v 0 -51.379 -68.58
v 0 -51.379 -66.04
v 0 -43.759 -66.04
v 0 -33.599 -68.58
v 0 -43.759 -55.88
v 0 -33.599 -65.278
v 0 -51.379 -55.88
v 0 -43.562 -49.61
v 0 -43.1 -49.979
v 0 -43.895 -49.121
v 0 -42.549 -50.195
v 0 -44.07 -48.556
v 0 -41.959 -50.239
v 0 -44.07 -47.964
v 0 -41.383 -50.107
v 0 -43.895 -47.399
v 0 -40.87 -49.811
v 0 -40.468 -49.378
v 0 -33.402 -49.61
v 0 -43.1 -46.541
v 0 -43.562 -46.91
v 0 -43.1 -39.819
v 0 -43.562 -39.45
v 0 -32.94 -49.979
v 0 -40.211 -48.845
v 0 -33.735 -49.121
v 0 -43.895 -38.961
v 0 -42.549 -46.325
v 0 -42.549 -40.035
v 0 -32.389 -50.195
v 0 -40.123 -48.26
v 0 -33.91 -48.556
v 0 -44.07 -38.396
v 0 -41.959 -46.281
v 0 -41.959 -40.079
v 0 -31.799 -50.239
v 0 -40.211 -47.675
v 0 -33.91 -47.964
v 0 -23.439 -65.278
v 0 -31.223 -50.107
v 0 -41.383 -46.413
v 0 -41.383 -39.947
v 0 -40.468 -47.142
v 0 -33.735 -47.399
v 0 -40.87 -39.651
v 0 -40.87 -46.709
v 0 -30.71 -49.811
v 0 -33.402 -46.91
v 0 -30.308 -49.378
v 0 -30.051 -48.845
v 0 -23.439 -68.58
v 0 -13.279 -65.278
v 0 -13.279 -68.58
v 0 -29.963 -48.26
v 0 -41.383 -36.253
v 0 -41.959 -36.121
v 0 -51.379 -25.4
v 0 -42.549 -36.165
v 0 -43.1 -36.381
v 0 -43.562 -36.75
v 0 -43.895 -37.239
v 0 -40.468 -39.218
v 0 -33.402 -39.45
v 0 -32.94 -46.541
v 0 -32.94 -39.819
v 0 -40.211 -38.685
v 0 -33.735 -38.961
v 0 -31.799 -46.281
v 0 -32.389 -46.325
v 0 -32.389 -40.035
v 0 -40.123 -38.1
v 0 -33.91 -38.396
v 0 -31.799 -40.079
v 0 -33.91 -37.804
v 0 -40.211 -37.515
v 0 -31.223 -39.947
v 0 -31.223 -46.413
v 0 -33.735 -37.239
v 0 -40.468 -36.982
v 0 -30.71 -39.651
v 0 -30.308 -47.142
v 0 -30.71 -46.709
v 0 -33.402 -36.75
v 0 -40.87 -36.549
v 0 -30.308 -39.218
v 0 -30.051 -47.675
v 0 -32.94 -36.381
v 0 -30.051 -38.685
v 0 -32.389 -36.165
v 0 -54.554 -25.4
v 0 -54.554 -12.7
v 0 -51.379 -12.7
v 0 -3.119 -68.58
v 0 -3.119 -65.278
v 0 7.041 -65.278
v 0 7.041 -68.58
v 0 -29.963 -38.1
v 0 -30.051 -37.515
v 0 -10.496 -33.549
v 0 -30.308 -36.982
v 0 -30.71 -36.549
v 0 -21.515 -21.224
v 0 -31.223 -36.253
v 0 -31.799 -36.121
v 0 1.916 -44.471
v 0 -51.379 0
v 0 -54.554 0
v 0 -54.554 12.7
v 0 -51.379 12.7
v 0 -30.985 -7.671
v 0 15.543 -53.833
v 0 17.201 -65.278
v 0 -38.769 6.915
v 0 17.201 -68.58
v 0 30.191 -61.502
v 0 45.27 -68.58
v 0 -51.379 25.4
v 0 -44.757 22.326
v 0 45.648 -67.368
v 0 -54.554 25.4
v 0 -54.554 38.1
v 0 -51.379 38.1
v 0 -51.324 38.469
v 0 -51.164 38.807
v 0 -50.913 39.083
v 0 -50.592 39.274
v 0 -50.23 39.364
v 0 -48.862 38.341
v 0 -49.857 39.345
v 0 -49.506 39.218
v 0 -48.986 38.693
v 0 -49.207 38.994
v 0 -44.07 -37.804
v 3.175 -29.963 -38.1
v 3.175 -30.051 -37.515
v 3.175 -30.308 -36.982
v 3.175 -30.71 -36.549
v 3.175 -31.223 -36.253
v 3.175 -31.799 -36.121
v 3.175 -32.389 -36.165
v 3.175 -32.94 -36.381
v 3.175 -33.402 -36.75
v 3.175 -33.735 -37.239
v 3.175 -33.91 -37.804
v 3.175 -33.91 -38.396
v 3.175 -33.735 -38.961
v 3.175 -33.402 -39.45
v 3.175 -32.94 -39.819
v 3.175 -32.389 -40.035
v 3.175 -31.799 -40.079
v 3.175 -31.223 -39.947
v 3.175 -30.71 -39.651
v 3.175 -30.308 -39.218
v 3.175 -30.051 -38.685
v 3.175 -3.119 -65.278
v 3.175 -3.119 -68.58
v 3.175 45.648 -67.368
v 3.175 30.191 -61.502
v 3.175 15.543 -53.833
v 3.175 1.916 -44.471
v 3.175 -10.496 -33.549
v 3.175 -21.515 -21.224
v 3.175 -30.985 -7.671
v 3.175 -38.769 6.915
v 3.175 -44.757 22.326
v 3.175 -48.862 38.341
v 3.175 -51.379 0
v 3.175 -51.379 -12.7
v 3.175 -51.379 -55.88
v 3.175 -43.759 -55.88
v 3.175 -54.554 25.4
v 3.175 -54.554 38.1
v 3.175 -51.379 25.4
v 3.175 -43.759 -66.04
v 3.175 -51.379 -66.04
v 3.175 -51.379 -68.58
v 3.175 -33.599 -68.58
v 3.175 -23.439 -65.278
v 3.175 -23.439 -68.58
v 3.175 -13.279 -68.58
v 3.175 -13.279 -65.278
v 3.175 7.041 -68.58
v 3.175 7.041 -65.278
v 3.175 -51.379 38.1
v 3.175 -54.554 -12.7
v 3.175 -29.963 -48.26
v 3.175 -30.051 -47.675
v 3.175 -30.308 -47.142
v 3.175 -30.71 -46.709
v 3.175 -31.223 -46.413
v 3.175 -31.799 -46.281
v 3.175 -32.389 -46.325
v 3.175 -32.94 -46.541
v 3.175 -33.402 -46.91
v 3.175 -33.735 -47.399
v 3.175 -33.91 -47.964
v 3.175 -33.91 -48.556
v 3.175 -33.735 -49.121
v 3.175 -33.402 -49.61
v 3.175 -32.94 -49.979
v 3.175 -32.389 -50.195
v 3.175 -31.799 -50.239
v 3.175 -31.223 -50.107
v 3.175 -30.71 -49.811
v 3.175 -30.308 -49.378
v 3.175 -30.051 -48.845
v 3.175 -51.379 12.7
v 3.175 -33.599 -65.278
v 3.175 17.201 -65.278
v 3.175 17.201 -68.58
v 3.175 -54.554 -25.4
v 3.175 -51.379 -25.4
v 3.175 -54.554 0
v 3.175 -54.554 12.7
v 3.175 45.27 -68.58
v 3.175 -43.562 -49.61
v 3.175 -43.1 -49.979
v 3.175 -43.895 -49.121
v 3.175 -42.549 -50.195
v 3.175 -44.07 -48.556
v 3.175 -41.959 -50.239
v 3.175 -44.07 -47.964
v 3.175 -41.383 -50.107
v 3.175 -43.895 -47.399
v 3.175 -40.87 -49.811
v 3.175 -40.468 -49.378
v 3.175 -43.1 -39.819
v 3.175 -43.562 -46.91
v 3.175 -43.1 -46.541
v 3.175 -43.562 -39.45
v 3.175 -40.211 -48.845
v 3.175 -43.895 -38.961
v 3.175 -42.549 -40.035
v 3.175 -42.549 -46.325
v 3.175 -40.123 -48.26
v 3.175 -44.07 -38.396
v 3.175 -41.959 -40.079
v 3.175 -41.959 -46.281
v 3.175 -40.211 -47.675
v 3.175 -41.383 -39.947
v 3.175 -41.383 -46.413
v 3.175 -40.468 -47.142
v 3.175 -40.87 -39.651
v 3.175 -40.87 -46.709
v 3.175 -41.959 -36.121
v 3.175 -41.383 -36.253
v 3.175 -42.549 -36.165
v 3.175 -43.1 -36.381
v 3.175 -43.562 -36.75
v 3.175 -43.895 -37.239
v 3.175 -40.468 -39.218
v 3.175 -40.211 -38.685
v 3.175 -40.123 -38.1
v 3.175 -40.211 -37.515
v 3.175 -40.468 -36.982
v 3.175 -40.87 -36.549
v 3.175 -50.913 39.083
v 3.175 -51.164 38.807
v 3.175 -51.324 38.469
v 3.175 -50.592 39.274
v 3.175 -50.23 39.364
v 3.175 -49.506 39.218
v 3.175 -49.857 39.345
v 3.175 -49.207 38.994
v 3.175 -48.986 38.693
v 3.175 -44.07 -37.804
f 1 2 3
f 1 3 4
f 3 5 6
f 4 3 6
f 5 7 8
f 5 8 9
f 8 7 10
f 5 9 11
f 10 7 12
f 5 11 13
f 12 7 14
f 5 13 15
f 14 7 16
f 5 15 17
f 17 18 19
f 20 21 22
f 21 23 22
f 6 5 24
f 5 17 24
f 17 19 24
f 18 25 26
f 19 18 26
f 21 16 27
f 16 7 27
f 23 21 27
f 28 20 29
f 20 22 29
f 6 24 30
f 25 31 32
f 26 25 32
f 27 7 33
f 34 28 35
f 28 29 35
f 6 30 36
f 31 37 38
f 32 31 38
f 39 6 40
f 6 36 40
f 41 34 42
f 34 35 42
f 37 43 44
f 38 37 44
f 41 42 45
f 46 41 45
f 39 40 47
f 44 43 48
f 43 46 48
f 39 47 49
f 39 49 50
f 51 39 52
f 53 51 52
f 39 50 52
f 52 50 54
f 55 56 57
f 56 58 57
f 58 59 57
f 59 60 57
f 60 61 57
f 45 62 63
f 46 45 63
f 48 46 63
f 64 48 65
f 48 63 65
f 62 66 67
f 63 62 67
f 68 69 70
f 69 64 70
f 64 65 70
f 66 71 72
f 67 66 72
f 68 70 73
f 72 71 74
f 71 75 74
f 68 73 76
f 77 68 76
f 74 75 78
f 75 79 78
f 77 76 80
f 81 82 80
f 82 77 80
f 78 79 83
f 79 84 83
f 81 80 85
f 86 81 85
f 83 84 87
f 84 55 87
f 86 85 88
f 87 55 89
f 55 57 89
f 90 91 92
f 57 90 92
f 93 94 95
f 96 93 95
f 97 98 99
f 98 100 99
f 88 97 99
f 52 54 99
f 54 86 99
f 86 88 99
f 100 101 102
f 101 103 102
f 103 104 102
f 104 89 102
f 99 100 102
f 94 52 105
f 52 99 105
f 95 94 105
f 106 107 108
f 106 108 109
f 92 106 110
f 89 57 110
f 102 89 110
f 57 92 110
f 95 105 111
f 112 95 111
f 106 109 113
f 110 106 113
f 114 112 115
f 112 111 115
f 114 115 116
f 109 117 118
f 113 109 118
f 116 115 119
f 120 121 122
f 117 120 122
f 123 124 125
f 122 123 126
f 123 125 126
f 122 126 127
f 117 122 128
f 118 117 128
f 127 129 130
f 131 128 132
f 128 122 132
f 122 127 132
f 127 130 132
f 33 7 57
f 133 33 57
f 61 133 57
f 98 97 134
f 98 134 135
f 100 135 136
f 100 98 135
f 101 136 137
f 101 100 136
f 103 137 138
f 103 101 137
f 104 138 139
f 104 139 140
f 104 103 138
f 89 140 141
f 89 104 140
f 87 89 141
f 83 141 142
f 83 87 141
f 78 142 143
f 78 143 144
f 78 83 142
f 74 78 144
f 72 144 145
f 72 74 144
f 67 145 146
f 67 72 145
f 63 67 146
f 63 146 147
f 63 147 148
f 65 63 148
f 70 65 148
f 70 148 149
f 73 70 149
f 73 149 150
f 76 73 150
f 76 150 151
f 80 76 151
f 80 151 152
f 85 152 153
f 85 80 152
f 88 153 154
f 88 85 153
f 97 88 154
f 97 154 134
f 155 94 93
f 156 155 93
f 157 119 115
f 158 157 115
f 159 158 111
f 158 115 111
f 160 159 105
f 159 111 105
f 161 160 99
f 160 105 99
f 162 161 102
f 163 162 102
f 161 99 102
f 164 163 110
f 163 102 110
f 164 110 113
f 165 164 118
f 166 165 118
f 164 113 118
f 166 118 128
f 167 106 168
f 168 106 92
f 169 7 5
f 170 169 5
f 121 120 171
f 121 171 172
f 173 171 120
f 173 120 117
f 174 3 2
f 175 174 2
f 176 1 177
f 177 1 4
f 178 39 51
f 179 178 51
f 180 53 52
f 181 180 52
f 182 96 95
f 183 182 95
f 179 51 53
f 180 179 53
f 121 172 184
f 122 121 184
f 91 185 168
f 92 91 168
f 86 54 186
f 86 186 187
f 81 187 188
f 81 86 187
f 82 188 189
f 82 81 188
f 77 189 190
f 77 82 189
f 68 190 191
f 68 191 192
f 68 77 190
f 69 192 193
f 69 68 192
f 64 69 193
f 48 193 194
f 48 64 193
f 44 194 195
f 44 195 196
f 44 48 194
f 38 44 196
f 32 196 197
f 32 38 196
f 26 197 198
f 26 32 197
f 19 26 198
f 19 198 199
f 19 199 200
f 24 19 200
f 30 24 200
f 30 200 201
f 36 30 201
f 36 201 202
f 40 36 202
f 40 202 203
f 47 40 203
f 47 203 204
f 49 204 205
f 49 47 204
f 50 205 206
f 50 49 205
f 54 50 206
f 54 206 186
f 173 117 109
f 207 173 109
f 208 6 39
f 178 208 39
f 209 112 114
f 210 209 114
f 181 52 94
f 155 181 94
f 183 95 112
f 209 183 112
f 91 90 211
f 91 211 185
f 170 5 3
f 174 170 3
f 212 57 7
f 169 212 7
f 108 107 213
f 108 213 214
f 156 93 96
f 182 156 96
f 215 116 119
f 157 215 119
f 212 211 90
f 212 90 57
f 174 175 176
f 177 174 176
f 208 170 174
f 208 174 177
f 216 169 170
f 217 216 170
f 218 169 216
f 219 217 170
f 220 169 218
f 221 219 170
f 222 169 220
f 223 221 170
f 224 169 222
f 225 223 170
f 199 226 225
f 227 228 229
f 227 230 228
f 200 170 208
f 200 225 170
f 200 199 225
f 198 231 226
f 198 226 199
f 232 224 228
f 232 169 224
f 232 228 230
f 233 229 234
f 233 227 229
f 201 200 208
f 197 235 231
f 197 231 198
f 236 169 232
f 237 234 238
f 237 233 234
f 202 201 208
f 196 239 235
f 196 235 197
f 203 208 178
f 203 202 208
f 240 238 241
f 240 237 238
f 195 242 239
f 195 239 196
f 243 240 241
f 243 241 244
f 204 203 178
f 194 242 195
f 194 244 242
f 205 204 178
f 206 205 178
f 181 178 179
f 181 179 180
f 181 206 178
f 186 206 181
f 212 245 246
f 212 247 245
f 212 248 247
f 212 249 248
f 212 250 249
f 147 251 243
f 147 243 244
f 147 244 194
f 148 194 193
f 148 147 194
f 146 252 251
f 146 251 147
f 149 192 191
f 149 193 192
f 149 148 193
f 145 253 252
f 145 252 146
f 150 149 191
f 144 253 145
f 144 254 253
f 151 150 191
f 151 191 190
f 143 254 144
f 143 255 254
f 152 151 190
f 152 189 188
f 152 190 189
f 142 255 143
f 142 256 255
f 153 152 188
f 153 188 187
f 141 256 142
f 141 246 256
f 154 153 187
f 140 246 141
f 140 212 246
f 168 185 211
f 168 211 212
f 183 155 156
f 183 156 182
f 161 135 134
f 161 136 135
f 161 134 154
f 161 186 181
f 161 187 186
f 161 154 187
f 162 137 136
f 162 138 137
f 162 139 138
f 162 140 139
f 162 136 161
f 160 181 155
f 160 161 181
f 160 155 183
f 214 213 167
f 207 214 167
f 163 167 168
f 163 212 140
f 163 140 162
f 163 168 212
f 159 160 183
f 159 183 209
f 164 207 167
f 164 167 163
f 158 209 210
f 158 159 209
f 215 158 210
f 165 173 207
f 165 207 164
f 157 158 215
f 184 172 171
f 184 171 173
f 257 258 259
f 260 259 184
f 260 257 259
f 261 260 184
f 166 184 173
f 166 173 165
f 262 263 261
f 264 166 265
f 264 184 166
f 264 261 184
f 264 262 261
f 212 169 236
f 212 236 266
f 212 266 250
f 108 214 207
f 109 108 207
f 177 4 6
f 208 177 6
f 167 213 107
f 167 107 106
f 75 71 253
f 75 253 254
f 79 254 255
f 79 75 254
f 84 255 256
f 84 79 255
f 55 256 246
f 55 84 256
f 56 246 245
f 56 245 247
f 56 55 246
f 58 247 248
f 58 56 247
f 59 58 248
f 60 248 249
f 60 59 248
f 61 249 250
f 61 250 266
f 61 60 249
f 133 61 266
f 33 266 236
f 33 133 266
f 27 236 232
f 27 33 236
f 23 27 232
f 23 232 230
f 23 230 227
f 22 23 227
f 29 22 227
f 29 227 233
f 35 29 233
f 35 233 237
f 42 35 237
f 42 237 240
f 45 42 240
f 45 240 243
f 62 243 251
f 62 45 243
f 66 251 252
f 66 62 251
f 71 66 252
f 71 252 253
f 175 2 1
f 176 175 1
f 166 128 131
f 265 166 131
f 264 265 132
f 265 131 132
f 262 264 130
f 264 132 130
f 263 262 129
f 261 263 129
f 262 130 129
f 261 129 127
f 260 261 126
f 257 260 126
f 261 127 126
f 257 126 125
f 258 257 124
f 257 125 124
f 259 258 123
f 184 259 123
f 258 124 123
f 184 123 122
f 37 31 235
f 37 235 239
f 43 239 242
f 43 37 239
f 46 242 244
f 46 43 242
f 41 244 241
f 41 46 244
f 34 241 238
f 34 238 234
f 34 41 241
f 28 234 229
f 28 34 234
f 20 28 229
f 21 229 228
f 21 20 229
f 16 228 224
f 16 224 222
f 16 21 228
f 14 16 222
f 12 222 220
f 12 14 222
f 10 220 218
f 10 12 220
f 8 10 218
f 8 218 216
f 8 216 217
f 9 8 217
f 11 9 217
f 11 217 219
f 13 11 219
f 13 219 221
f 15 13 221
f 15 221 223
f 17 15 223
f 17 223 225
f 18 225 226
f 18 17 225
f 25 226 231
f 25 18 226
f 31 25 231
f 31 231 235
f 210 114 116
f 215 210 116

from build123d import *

# Parameters (mm, degrees)
F0_W     = 3.175
F0_H     = 12.7
F0_R     = 1.984375
F1_DEPTH = 3.175


with BuildPart() as f1:
    # F0 (on Right) → F1 (new body)
    with BuildSketch(Plane.YZ):
        with Locations((-52.966131, 31.75)):
            Rectangle(F0_W, F0_H)
        with Locations((-52.966131, 6.35)):
            Rectangle(F0_W, F0_H)
        with Locations((-52.966131, -19.05)):
            Rectangle(F0_W, F0_H)
        with BuildLine():
            ThreePointArc((-48.86175, 38.34122), (-50.229793, 39.364207), (-51.378631, 38.1))
            Line((-51.378631, 38.1), (-51.378631, 25.4))
            Line((-51.378631, 25.4), (-51.378631, 12.7))
            Line((-51.378631, 12.7), (-51.378631, 0))
            Line((-51.378631, 0), (-51.378631, -12.7))
            Line((-51.378631, -12.7), (-51.378631, -25.4))
            Line((-51.378631, -25.4), (-51.378631, -55.88))
            Line((-51.378631, -55.88), (-43.758631, -55.88))
            Line((-43.758631, -55.88), (-43.758631, -66.04))
            Line((-43.758631, -66.04), (-51.378631, -66.04))
            Line((-51.378631, -66.04), (-51.378631, -68.58))
            Line((-51.378631, -68.58), (-33.598631, -68.58))
            Line((-33.598631, -68.58), (-33.598631, -65.278))
            Line((-33.598631, -65.278), (-23.438631, -65.278))
            Line((-23.438631, -65.278), (-23.438631, -68.58))
            Line((-23.438631, -68.58), (-13.278631, -68.58))
            Line((-13.278631, -68.58), (-13.278631, -65.278))
            Line((-13.278631, -65.278), (-3.118631, -65.278))
            Line((-3.118631, -65.278), (-3.118631, -68.58))
            Line((-3.118631, -68.58), (7.041369, -68.58))
            Line((7.041369, -68.58), (7.041369, -65.278))
            Line((7.041369, -65.278), (17.201369, -65.278))
            Line((17.201369, -65.278), (17.201369, -68.58))
            Line((17.201369, -68.58), (45.269527, -68.58))
            Line((45.269527, -68.58), (45.648292, -67.367797))
            ThreePointArc((45.648292, -67.367797), (-16.189845, -27.551447), (-48.86175, 38.34122))
        make_face()
        with Locations((-42.107631, -48.26)):
            Circle(F0_R, mode=Mode.SUBTRACT)
        with Locations((-31.947631, -48.26)):
            Circle(F0_R, mode=Mode.SUBTRACT)
        with Locations((-42.107631, -38.1)):
            Circle(F0_R, mode=Mode.SUBTRACT)
        with Locations((-31.947631, -38.1)):
            Circle(F0_R, mode=Mode.SUBTRACT)
    extrude(amount=F1_DEPTH)


solid = f1.part
